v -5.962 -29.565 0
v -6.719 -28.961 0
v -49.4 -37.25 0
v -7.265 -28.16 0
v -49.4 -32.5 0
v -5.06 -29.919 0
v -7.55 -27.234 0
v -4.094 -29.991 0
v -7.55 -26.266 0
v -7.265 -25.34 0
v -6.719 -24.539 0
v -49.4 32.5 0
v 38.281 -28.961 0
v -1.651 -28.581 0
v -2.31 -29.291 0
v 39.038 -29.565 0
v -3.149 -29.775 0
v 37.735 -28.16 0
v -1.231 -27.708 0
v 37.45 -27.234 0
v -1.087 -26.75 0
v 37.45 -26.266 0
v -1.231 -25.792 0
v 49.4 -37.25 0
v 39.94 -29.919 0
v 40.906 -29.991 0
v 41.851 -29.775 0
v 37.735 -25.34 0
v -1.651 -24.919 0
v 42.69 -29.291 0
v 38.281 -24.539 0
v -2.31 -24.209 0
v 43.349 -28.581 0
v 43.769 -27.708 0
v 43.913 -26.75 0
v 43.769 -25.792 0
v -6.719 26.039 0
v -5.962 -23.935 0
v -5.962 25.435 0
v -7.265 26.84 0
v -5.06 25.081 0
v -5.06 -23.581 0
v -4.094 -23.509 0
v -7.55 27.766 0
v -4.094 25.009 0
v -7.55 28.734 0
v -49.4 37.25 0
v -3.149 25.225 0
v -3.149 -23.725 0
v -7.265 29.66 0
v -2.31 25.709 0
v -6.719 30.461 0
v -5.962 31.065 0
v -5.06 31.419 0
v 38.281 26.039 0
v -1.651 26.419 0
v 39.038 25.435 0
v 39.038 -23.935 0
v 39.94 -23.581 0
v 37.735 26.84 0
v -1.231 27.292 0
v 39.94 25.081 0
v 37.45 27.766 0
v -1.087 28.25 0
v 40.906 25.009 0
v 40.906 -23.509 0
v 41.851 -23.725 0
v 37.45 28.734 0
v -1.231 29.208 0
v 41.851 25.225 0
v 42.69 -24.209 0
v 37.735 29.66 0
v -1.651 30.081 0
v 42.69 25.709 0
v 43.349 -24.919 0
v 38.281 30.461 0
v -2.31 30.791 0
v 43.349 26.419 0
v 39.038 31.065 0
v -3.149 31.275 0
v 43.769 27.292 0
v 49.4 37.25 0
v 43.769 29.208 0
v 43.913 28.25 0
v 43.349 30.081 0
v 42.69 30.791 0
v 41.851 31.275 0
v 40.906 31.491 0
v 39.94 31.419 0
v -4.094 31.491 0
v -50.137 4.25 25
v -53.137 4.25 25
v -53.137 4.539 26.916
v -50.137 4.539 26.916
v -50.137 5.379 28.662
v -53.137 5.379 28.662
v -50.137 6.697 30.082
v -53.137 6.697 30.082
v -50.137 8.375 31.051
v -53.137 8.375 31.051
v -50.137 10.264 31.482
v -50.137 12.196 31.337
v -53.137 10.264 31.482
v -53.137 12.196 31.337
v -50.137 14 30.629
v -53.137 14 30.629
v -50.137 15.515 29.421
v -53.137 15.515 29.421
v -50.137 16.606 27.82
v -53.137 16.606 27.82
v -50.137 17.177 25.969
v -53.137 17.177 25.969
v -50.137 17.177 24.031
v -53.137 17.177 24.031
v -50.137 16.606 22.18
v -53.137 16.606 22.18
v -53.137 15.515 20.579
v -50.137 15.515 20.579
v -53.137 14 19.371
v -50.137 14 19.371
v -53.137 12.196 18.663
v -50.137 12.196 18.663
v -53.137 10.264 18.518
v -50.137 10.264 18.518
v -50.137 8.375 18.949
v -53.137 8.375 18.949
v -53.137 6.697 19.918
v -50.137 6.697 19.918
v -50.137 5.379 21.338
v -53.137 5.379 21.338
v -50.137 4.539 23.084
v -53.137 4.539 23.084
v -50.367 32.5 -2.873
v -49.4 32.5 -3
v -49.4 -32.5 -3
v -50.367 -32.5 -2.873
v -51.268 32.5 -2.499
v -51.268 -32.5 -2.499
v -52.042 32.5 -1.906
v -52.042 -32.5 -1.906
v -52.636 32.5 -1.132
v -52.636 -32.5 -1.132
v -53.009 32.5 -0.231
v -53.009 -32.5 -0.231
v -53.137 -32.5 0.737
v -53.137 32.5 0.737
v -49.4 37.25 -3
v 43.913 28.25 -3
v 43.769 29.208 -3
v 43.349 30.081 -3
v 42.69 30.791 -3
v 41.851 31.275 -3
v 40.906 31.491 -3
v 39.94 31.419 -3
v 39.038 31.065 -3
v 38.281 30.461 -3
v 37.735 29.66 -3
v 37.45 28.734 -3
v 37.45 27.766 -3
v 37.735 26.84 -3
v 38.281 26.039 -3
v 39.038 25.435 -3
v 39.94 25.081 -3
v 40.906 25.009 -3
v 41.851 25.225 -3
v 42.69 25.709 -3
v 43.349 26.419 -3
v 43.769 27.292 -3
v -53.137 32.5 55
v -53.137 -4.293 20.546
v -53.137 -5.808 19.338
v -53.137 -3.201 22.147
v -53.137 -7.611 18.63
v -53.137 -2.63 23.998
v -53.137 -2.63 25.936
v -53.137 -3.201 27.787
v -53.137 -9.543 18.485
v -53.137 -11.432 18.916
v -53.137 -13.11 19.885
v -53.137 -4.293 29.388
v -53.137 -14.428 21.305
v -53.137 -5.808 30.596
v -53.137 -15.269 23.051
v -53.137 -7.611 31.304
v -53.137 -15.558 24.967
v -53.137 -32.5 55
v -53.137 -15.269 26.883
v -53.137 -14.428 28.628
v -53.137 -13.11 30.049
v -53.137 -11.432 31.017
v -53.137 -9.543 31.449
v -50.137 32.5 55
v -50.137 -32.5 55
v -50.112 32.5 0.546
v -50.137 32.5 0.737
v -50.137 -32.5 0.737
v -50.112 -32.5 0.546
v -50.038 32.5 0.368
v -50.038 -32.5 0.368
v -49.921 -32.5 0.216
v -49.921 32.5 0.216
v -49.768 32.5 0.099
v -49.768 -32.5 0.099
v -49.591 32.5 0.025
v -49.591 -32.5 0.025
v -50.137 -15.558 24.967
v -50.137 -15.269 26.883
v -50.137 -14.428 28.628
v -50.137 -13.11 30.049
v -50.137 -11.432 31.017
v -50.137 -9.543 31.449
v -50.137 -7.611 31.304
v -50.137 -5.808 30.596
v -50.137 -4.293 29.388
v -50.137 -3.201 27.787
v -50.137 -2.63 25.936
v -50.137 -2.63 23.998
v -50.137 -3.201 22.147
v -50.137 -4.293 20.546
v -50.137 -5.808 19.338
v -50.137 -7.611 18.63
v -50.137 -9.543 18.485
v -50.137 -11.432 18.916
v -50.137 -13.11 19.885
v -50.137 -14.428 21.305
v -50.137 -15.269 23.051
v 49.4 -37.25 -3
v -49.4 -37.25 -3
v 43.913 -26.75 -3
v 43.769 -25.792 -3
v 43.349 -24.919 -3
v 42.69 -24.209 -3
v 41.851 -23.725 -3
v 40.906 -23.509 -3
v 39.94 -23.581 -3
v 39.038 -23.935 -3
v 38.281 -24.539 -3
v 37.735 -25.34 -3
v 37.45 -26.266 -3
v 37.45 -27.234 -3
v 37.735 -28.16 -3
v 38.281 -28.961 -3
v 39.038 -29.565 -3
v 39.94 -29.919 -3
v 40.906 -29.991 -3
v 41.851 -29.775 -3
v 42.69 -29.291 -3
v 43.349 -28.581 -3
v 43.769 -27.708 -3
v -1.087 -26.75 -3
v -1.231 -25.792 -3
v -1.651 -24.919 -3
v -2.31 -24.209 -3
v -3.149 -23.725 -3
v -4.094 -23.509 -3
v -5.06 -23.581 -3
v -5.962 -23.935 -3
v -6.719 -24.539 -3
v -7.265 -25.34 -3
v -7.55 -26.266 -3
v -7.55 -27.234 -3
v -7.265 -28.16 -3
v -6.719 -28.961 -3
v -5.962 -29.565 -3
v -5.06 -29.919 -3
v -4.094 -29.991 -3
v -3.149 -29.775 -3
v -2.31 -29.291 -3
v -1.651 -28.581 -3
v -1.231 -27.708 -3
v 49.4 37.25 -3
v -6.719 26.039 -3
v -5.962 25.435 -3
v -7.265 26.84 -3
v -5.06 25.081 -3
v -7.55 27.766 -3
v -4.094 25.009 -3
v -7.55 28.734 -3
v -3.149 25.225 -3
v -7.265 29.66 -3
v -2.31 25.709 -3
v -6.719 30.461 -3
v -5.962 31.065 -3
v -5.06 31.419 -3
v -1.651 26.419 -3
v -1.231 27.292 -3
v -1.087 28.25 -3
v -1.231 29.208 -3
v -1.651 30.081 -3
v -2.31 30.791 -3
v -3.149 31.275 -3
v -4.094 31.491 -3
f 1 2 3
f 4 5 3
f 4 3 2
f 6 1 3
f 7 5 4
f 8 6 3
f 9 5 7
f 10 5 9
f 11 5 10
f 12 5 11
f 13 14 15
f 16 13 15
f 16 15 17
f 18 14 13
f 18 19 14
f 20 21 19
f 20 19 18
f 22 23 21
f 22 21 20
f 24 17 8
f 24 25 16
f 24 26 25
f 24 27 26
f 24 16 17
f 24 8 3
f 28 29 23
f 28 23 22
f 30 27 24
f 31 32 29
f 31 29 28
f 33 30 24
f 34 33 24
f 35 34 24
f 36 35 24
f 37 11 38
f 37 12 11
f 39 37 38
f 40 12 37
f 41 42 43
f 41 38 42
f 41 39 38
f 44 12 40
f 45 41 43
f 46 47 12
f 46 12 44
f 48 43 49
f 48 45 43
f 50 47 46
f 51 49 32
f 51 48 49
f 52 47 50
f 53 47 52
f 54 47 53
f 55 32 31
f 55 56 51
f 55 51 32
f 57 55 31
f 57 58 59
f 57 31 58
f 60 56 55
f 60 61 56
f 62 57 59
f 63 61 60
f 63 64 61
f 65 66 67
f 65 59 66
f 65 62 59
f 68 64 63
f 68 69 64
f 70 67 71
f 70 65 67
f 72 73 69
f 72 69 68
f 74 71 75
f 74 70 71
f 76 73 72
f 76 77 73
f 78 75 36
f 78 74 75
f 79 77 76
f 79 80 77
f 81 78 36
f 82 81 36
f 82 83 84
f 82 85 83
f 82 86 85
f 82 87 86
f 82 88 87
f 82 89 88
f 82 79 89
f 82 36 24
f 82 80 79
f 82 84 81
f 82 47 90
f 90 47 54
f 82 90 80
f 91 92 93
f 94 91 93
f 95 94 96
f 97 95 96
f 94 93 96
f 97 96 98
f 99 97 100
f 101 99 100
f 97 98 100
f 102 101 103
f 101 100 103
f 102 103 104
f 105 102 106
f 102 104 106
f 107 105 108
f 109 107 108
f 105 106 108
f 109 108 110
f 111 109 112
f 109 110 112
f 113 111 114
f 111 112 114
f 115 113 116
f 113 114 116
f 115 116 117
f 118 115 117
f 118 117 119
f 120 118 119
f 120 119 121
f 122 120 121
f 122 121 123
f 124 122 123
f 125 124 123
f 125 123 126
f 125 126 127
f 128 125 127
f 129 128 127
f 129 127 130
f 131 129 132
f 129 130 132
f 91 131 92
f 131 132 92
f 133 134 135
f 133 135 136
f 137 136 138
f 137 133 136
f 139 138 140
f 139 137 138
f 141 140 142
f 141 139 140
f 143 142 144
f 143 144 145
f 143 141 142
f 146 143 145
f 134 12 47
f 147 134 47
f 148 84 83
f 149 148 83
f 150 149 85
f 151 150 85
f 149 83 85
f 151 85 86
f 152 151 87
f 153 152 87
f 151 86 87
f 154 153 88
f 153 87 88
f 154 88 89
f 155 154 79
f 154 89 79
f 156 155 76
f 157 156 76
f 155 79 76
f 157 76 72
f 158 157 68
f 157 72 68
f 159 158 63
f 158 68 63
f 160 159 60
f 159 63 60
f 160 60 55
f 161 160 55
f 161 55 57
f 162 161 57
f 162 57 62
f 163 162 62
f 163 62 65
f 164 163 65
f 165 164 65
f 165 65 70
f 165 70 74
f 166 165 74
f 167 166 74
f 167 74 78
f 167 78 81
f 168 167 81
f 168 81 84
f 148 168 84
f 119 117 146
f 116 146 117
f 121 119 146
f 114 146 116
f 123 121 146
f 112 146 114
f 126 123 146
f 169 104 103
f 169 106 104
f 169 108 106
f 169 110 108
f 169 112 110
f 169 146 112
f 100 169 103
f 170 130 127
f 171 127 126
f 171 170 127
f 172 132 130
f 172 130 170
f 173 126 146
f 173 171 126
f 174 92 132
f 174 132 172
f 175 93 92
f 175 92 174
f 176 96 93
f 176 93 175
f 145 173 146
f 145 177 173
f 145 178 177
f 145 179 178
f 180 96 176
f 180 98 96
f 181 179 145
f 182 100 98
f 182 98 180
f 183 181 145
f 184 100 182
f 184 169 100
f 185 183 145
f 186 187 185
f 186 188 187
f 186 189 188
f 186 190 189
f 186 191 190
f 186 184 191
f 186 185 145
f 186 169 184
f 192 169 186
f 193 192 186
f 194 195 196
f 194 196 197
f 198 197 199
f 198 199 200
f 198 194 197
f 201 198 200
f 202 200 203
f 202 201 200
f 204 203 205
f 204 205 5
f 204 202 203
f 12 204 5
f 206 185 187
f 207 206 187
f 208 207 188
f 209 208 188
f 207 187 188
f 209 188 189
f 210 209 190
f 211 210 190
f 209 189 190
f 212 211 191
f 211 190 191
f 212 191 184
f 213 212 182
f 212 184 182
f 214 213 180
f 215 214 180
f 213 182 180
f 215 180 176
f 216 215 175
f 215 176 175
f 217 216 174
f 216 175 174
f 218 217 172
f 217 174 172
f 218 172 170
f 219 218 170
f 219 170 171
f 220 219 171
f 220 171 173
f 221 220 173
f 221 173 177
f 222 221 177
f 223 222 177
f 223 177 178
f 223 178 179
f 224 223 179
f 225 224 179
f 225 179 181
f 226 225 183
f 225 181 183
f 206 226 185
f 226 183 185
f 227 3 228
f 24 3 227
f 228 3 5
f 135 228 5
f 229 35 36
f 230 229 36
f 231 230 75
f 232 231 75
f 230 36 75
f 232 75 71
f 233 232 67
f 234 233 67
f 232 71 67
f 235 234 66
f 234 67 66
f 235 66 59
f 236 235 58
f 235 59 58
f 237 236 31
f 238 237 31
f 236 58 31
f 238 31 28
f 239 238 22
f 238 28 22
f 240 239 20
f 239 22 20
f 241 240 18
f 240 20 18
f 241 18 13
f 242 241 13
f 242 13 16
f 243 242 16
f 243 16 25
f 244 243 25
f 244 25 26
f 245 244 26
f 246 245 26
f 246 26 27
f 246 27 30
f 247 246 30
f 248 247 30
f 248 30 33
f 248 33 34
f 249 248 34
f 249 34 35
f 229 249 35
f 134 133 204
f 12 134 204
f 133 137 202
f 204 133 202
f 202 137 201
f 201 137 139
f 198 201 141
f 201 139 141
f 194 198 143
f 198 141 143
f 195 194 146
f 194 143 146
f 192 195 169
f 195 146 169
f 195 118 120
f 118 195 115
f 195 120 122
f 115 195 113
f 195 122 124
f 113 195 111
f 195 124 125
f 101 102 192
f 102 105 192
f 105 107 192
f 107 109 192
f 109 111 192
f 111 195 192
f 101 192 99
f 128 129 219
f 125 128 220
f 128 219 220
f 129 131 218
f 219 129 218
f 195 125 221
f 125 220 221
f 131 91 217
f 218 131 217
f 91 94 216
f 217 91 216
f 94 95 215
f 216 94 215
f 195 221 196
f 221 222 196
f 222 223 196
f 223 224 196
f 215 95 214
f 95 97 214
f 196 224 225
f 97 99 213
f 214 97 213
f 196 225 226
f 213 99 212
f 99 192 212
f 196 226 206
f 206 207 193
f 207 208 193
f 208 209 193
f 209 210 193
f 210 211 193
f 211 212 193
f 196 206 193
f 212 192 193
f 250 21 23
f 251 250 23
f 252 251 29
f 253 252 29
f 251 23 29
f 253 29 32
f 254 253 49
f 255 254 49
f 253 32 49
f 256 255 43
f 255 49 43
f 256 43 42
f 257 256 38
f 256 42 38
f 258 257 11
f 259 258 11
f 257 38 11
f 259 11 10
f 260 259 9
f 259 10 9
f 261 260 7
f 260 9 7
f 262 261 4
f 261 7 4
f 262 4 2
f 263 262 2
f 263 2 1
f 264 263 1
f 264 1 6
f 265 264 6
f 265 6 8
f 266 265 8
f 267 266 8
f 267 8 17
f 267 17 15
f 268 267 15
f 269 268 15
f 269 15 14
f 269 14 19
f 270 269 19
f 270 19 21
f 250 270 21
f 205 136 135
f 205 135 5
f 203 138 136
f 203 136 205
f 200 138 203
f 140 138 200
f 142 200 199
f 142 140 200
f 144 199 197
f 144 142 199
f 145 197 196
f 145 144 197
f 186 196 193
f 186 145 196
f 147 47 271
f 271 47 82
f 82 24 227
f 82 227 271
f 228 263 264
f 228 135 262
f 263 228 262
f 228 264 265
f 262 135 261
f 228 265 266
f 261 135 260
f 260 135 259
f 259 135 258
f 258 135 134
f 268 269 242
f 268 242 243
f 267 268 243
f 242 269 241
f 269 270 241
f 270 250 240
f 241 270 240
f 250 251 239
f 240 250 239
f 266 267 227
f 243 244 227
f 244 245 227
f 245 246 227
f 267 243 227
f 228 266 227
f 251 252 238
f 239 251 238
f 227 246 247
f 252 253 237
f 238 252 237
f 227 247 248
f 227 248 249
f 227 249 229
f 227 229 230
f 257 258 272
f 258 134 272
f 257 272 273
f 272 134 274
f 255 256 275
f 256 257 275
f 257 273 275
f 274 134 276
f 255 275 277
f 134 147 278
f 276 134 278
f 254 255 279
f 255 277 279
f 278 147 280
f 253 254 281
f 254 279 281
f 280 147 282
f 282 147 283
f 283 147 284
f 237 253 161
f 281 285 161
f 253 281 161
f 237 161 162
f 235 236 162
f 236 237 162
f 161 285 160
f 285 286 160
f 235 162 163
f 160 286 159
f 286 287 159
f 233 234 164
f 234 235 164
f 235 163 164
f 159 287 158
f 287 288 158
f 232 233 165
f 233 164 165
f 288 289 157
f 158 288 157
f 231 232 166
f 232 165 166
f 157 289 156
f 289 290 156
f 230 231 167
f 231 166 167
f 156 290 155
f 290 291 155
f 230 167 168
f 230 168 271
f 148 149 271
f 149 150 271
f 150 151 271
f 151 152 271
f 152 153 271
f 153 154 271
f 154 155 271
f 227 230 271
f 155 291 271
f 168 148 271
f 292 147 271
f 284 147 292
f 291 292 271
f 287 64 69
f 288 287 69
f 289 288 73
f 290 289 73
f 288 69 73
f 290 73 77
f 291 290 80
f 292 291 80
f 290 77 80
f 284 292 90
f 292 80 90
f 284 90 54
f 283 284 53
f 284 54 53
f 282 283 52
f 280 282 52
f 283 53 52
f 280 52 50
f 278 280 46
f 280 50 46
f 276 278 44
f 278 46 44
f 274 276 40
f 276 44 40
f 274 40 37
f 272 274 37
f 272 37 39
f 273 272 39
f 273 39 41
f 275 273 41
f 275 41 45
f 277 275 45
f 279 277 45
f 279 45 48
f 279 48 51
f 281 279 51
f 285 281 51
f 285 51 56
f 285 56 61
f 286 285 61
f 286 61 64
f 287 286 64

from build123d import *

# Parameters (mm, degrees)
SKETCH2_W               = 98.8
SKETCH2_H               = 74.5
BASE_FLANGE1_DEPTH      = 3
KENAR_FLAN_1_DEPTH      = 65
KENAR_FLAN_1_START      = 3
KENAR_FLAN_1_PROFILE_W  = 65
KENAR_FLAN_1_PROFILE_H  = 54.2634
KENAR_FLAN_1_PROFILE_R  = 6.5
KENAR_FLAN_1_FLAT_DEPTH = 3
SKETCH10_R              = 3.25
CUT_EXTRUDE2_DEPTH      = 10


# Sheet-metal steps are written as plain solids
with BuildPart() as part:
    # Sketch2 → Base-Flange1 (new body)
    with BuildSketch(Plane.XY):
        Rectangle(SKETCH2_W, SKETCH2_H)
    extrude(amount=-BASE_FLANGE1_DEPTH)

    # Kenar-Flanş1 bend section (across the edge) → Kenar-Flanş1 (add)
    with BuildSketch(Plane(origin=(-50.1366, 32.5, 0), x_dir=(1, 0, 0), z_dir=(0, -1, 0))):
        with BuildLine():
            Line((-3, 0.7366), (0, 0.7366))
            ThreePointArc((0, 0.7366), (0.215745145, 0.215745145), (0.7366, 0))
            Line((0.7366, 0), (0.7366, -3))
            ThreePointArc((0.7366, -3), (-1.905575199, -1.905575199), (-3, 0.7366))
        make_face()
    extrude(amount=KENAR_FLAN_1_DEPTH)

    # Kenar-Flanş1 profile (on flange) → Kenar-Flanş1 flat (add)
    with BuildSketch(Plane(origin=(-50.1366, 0, 0), x_dir=(0, -1, 0), z_dir=(-1, 0, 0)).offset(KENAR_FLAN_1_START)):
        with Locations((0, 27.8683)):
            Rectangle(KENAR_FLAN_1_PROFILE_W, KENAR_FLAN_1_PROFILE_H)
        with Locations((9.057623393, 24.966787755)):
            Circle(KENAR_FLAN_1_PROFILE_R, mode=Mode.SUBTRACT)
        with Locations((-10.75, 25)):
            Circle(KENAR_FLAN_1_PROFILE_R, mode=Mode.SUBTRACT)
    extrude(amount=-KENAR_FLAN_1_FLAT_DEPTH)

    # Sketch10 → Cut-Extrude2 (cut)
    with BuildSketch(Plane.XY):
        with Locations((40.6634, -26.75)):
            Circle(SKETCH10_R)
        with Locations((-4.3366, -26.75)):
            Circle(SKETCH10_R)
        with Locations((-4.3366, 28.25)):
            Circle(SKETCH10_R)
        with Locations((40.6634, 28.25)):
            Circle(SKETCH10_R)
    extrude(amount=-CUT_EXTRUDE2_DEPTH, mode=Mode.SUBTRACT)


solid = part.part
